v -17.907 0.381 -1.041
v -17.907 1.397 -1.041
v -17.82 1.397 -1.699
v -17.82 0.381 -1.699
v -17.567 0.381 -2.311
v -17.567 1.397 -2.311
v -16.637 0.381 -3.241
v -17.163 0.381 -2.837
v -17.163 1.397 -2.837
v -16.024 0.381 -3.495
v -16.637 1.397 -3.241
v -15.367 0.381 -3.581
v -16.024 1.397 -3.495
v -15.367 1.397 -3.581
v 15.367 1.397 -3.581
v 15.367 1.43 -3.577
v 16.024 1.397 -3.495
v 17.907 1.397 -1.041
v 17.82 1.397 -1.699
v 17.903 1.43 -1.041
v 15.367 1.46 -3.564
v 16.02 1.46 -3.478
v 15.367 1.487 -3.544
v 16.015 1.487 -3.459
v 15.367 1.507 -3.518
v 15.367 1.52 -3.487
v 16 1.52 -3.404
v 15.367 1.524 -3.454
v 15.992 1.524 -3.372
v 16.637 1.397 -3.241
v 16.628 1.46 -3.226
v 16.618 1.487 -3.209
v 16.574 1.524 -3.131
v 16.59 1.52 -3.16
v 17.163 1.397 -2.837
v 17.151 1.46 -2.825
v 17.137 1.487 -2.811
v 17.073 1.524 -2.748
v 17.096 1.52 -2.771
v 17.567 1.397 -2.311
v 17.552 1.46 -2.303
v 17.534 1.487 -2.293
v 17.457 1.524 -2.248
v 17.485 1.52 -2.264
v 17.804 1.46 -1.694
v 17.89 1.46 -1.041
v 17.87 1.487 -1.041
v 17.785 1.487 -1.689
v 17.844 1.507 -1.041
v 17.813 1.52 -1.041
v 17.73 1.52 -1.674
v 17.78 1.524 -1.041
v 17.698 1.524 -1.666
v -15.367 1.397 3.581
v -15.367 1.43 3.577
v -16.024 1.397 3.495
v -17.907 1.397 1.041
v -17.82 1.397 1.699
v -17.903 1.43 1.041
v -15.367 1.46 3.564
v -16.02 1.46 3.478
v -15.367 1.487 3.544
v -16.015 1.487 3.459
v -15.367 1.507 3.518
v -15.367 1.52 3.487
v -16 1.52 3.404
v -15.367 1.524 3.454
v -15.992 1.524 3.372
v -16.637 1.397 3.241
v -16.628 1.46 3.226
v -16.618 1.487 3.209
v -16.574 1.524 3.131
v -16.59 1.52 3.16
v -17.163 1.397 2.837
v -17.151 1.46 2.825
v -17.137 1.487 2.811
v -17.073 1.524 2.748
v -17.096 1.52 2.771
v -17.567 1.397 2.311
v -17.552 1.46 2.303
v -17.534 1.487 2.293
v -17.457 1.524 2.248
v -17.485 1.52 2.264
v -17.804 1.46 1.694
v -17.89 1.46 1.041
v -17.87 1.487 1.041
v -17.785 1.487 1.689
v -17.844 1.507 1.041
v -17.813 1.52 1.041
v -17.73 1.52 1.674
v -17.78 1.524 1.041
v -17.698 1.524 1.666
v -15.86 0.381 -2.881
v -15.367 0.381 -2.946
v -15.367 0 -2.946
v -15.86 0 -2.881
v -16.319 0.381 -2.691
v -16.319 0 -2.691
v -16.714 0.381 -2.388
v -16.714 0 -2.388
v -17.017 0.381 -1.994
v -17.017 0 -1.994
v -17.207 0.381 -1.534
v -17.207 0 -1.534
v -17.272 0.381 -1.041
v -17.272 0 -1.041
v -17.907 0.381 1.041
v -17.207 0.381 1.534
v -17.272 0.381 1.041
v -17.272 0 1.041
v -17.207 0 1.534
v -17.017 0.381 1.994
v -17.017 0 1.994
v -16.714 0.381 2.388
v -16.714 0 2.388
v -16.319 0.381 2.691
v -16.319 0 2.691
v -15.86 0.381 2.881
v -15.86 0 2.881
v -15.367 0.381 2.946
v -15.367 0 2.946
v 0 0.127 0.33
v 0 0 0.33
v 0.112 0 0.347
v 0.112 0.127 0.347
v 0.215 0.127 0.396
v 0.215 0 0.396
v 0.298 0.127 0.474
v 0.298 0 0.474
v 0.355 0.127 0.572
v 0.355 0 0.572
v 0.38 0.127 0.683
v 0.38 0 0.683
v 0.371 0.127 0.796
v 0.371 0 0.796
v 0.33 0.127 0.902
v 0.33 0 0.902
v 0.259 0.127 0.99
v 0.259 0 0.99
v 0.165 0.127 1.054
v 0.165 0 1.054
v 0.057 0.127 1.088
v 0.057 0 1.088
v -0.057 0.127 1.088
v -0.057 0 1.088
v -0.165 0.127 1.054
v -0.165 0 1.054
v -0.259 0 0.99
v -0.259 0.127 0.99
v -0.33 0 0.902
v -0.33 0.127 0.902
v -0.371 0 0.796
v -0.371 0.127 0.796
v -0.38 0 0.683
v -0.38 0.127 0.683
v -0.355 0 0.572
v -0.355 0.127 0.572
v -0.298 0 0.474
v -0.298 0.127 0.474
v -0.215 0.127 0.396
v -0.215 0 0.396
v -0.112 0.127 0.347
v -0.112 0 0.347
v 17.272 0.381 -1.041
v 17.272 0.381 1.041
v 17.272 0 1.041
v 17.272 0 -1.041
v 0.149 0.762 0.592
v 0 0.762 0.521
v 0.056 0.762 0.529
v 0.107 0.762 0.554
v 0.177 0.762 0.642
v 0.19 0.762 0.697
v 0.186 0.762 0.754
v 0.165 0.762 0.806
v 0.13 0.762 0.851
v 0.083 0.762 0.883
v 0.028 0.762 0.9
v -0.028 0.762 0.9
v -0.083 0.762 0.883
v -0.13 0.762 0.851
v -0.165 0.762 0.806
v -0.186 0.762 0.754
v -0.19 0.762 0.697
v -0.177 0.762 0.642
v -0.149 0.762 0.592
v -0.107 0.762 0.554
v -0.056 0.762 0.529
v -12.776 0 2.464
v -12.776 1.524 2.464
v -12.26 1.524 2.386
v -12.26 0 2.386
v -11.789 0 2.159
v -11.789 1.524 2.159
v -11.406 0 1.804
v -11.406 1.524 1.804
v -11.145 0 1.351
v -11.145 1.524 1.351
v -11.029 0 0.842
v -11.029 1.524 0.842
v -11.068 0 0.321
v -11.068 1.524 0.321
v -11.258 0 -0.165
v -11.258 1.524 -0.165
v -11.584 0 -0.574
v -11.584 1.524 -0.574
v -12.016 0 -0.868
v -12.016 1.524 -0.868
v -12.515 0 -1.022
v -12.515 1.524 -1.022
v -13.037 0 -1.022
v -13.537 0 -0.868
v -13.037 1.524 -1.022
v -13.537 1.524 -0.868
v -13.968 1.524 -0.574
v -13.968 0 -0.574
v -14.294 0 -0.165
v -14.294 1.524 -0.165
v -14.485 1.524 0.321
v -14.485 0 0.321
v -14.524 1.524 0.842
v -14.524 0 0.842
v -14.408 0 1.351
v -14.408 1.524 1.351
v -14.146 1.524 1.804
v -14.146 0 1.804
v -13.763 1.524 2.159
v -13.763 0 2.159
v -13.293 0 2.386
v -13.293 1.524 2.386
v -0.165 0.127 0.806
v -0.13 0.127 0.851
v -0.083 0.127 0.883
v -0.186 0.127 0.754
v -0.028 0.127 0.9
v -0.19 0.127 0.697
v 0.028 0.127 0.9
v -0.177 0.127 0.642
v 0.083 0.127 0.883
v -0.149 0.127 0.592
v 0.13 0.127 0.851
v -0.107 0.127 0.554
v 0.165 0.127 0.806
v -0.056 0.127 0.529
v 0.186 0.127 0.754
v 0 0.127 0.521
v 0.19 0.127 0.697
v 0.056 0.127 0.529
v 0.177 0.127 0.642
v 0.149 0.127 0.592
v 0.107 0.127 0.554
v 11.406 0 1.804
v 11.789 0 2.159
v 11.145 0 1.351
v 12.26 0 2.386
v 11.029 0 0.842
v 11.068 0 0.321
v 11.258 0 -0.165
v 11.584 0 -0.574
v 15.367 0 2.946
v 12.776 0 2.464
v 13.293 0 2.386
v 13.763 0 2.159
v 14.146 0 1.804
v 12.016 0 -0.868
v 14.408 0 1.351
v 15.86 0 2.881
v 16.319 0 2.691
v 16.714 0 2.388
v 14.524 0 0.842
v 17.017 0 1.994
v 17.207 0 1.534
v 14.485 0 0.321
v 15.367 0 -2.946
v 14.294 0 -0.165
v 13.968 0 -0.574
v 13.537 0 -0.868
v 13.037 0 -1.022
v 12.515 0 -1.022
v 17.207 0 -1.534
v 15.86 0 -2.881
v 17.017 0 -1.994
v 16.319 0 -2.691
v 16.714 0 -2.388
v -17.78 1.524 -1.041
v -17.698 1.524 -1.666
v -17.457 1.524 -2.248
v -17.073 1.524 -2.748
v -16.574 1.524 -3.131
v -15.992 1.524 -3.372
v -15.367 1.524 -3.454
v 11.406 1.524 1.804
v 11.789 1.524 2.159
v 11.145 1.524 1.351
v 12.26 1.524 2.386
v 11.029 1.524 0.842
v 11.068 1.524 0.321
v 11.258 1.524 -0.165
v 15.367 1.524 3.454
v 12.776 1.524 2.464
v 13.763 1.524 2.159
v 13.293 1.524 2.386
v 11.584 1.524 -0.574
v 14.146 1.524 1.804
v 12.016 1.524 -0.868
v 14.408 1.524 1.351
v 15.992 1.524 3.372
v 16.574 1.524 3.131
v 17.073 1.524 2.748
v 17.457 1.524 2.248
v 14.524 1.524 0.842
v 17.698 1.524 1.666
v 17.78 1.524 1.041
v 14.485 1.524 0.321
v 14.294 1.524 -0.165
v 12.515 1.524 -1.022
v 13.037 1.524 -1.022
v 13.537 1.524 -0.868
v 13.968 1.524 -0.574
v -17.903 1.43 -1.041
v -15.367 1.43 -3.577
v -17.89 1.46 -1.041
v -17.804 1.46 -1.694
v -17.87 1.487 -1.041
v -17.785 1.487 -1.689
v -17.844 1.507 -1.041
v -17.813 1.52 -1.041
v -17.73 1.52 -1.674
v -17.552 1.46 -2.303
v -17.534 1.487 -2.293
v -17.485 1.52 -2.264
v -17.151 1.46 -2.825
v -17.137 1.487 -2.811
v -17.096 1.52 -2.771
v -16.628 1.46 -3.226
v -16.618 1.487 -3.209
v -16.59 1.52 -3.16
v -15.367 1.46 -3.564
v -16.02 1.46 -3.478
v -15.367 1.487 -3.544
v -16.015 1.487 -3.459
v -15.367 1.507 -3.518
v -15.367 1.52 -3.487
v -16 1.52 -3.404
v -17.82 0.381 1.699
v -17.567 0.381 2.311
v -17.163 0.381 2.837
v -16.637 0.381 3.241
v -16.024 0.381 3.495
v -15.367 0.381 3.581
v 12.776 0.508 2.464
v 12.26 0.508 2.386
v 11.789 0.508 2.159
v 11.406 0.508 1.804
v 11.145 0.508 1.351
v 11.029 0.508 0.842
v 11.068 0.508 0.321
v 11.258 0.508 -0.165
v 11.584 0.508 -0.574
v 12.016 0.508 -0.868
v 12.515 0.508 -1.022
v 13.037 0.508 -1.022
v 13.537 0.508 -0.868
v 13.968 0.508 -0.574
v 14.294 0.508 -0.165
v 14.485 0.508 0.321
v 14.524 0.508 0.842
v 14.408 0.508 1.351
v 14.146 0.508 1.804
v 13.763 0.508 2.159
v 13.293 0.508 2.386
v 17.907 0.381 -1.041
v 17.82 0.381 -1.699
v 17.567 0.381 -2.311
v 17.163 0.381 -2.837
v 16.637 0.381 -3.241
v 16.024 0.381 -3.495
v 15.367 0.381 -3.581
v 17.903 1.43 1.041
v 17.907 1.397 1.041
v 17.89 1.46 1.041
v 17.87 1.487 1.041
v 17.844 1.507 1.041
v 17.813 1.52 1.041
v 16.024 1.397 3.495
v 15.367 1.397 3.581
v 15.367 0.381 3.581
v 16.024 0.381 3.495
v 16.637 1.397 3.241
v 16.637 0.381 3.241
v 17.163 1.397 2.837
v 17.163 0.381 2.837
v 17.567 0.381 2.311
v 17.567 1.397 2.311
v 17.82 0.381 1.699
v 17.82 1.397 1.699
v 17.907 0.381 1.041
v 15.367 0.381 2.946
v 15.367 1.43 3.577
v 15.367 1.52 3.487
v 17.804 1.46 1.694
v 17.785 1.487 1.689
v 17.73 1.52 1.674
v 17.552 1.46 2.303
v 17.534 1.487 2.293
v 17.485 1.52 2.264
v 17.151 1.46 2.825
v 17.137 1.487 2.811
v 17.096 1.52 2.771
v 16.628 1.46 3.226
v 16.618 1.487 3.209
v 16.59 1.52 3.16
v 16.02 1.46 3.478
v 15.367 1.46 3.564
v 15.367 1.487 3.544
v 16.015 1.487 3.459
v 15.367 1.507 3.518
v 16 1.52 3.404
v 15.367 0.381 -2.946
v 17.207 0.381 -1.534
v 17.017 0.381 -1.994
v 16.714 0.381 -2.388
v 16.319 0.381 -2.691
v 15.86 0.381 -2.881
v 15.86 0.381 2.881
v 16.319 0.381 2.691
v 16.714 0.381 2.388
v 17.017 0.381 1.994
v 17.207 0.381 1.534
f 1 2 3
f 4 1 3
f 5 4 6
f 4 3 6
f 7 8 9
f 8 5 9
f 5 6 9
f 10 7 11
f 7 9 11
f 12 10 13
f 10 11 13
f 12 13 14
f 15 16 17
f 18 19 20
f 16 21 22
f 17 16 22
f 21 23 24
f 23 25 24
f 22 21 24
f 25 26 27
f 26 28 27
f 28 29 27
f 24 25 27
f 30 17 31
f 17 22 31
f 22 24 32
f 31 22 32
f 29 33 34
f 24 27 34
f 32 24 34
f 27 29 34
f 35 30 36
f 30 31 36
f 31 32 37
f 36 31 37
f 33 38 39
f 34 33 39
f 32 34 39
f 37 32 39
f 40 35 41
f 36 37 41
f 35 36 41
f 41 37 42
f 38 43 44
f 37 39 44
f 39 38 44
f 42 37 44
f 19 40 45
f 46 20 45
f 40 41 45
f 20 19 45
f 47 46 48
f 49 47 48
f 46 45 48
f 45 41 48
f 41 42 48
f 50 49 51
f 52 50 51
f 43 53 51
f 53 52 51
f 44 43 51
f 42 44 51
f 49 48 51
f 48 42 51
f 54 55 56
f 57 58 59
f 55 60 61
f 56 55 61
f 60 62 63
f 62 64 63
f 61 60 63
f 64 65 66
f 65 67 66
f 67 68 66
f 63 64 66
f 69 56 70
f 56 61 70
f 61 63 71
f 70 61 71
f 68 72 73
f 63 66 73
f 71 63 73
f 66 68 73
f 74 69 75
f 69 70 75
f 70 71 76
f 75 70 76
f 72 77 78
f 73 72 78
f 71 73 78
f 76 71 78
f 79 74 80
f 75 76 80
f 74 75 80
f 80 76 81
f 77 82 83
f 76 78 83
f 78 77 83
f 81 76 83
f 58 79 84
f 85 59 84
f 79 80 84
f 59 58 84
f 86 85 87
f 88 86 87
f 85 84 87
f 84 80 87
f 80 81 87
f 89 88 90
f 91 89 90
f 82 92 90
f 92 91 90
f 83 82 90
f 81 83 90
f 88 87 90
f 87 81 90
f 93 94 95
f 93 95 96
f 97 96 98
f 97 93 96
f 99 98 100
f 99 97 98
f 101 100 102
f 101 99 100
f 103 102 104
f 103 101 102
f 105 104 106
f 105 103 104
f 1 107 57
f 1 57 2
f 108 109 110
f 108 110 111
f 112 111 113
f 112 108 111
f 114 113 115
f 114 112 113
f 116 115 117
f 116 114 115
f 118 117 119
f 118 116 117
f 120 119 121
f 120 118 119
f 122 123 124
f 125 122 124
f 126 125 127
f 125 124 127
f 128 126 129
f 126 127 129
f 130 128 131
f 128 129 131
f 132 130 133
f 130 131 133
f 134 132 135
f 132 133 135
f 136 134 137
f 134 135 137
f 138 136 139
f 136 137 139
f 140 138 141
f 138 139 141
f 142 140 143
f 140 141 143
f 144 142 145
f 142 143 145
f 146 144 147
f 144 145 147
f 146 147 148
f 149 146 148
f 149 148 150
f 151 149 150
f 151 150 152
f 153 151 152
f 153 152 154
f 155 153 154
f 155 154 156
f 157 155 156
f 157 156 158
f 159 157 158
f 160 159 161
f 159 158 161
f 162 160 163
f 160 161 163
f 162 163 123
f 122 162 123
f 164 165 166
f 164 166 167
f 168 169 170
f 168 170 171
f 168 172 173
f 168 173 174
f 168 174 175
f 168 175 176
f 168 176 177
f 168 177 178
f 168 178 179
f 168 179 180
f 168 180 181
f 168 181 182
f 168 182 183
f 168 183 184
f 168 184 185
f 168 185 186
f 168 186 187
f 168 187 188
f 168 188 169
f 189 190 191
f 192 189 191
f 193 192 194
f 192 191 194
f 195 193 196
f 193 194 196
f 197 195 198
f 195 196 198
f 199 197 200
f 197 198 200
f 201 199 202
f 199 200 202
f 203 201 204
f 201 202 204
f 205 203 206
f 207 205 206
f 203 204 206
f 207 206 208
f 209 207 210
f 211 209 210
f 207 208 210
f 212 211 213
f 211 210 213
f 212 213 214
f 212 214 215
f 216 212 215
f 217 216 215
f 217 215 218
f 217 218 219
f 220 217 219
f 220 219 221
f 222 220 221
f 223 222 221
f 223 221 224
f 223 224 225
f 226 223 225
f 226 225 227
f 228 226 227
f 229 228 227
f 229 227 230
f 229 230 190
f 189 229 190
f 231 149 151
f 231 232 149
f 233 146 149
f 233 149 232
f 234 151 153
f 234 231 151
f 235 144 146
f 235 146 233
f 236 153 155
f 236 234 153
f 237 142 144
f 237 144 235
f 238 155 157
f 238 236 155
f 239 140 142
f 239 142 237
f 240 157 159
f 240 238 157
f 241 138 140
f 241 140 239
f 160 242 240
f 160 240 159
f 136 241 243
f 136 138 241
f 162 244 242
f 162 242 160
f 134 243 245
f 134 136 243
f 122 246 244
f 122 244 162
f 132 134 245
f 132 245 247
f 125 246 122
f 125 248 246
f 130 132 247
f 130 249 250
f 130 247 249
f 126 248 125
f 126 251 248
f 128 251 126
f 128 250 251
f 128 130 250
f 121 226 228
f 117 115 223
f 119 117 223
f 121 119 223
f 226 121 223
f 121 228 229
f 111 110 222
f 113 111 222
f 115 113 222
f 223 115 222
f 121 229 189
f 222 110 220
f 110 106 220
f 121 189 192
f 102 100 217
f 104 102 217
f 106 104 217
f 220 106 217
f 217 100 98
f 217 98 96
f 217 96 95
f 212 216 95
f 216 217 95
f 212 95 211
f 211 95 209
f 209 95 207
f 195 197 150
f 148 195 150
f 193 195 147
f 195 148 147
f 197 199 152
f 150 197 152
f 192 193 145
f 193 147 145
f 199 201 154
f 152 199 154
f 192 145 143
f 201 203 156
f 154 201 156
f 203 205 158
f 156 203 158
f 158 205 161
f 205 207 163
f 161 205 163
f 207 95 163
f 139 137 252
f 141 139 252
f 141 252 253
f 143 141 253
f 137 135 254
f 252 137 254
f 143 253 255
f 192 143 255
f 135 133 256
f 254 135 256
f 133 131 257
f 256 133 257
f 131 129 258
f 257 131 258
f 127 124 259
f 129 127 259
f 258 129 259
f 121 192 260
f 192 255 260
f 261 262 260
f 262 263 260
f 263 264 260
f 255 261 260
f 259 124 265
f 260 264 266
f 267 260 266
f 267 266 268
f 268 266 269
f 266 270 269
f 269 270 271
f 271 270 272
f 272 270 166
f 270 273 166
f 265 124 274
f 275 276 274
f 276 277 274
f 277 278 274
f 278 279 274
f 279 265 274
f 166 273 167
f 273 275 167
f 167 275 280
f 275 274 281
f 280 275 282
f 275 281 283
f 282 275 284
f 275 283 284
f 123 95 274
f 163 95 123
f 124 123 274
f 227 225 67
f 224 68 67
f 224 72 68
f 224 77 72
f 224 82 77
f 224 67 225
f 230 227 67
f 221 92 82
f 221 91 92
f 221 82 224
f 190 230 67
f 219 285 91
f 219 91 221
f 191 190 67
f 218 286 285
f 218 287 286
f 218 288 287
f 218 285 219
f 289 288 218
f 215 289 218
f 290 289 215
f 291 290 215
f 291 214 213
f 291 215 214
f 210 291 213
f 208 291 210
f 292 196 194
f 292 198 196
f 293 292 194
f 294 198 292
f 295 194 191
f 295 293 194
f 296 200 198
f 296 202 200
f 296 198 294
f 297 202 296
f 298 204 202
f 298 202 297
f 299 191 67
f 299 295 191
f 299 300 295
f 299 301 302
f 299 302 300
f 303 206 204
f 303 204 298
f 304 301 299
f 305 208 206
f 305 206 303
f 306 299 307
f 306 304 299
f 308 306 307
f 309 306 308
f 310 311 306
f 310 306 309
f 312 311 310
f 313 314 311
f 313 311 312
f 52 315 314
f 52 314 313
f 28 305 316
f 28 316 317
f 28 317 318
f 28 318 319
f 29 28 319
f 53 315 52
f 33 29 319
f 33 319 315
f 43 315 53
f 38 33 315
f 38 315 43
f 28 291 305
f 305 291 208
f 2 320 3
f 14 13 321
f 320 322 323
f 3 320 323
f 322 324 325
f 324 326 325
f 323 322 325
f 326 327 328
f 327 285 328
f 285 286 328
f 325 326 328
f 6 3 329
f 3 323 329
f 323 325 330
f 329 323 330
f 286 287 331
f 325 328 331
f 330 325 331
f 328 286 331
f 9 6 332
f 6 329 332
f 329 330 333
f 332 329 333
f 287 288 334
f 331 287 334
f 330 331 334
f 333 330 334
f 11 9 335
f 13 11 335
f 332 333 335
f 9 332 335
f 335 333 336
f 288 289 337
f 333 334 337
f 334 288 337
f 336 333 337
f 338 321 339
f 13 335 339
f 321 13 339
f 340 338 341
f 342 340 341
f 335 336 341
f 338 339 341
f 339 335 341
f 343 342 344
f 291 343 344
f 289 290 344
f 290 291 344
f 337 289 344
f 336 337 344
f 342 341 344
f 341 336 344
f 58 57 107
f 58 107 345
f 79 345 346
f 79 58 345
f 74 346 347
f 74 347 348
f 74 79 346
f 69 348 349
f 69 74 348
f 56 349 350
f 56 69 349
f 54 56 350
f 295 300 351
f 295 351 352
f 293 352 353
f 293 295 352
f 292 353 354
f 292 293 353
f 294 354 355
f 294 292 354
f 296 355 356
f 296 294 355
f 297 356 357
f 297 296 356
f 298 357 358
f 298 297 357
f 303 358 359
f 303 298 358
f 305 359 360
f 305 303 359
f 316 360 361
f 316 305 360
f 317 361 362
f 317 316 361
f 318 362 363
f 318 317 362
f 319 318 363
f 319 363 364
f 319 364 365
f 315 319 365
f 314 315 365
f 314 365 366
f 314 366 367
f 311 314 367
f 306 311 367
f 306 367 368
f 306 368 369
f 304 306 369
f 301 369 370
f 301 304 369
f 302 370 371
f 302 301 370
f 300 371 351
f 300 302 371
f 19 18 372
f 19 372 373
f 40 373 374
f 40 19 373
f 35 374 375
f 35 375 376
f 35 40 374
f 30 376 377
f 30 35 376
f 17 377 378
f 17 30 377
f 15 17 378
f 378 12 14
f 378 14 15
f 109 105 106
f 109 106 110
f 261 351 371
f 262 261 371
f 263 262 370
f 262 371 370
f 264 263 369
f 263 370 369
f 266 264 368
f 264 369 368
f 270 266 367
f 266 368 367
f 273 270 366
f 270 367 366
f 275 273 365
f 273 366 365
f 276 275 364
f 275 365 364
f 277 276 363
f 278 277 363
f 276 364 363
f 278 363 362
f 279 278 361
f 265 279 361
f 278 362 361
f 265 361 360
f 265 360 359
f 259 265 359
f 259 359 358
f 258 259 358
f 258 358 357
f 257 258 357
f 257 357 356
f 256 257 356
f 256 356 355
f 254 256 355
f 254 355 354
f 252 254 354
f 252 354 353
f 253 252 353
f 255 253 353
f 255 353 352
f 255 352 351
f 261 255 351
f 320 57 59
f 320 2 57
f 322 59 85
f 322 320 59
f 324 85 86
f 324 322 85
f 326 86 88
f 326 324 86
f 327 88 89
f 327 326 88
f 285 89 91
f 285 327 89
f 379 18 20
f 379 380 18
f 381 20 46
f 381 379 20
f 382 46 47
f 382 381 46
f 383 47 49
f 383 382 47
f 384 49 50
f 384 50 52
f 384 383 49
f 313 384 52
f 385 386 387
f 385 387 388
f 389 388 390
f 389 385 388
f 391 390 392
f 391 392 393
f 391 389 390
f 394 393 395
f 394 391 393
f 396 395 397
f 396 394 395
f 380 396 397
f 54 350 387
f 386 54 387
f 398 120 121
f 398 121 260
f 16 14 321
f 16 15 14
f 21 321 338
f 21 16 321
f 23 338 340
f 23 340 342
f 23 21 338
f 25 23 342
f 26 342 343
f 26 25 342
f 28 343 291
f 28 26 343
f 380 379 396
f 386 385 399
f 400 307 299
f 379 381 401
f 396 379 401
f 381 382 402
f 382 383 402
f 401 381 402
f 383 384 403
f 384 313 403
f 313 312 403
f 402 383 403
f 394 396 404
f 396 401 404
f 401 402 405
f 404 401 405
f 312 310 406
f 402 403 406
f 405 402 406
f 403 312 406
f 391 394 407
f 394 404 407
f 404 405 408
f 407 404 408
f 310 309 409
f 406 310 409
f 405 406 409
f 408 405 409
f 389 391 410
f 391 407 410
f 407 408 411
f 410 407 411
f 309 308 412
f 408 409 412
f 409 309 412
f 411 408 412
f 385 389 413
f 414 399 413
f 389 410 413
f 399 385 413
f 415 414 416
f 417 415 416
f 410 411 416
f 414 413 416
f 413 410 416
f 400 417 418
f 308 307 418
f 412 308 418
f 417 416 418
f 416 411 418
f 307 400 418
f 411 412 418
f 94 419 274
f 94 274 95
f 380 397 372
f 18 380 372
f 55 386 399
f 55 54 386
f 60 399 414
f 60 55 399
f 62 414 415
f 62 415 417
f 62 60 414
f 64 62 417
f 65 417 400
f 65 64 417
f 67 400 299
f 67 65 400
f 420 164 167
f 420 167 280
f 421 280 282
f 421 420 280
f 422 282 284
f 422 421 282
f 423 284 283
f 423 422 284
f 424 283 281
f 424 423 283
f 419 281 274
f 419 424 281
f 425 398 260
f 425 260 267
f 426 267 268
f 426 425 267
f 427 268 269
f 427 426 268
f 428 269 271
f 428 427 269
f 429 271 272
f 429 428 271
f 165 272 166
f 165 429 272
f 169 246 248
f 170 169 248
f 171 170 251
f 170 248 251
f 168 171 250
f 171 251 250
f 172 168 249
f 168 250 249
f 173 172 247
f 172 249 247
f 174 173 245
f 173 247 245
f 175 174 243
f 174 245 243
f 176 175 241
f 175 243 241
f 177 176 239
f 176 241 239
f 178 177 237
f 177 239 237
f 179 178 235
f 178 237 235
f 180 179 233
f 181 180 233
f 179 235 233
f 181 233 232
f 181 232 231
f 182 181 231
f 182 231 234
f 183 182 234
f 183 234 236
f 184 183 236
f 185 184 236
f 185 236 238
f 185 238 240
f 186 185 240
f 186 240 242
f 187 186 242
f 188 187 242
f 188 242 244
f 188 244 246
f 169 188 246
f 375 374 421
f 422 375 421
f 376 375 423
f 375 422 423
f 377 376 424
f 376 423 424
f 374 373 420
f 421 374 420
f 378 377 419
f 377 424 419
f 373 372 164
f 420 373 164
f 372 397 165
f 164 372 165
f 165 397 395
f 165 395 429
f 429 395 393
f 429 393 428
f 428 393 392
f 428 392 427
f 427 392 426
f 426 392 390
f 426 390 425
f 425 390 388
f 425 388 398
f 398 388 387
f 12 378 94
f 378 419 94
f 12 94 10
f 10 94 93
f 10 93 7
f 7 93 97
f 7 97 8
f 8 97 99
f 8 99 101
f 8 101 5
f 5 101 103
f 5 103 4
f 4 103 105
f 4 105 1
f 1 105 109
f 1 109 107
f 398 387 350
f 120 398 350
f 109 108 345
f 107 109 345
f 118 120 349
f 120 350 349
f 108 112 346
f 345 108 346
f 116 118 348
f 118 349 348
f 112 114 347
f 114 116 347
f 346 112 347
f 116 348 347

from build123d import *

# Parameters (mm, degrees)
SKETCH1_W           = 35.814
SKETCH1_H           = 7.1628
BOSS_EXTRUDE1_DEPTH = 1.524
FILLET1_R           = 2.54
FILLET2_R           = 0.127
BOSS_EXTRUDE2_DEPTH = 0.381
SKETCH5_R           = 1.2827
CUT_EXTRUDE2_DEPTH  = 2.54
SKETCH9_R           = 1.7526
CUT_EXTRUDE5_DEPTH  = 1.016
CUT_EXTRUDE6_START  = -0.381
CUT_EXTRUDE6_DEPTH  = 0.381
SKETCH17_R          = 1.7526
CUT_EXTRUDE11_DEPTH = 19.289869627
SKETCH18_R          = 1.7526
CUT_EXTRUDE12_DEPTH = 19.325109849
SKETCH19_R          = 0.381
CUT_EXTRUDE13_DEPTH = 0.127
SKETCH20_R          = 0.1905
CUT_EXTRUDE14_DEPTH = 0.762


with BuildPart() as part:
    # Sketch1 → Boss-Extrude1 (new body)
    with BuildSketch(Plane(origin=(0, 0, 0), x_dir=(1, 0, 0), z_dir=(0, 1, 0))):
        Rectangle(SKETCH1_W, SKETCH1_H)
    extrude(amount=BOSS_EXTRUDE1_DEPTH)

    # Fillet1
    fillet1_edges = [part.edges().sort_by_distance(p)[0] for p in [
        (-17.907, 0.762, -3.5814),
        (17.907, 0.762, -3.5814),
        (17.907, 0.762, 3.5814),
        (-17.907, 0.762, 3.5814),
    ]]
    fillet(fillet1_edges, radius=FILLET1_R)

    # Fillet2
    fillet2_edges = [part.edges().sort_by_distance(p)[0] for p in [
        (-17.907, 1.524, 0),
        (0, 1.524, -3.5814),
        (0, 1.524, 3.5814),
        (17.907, 1.524, 0),
        (17.163051224, 1.524, 2.837451224),
        (17.163051224, 1.524, -2.837451224),
        (-17.163051224, 1.524, 2.837451224),
        (-17.163051224, 1.524, -2.837451224),
    ]]
    fillet(fillet2_edges, radius=FILLET2_R)

    # Sketch4 → Boss-Extrude2 (add)
    with BuildSketch(Plane.XZ.offset(-0.381)):
        with BuildLine():
            Line((-15.367, 2.9464), (-15.367, 3.2004))
            ThreePointArc((-15.367, 3.2004), (-16.893643541, 2.568043541), (-17.526, 1.0414))
            Line((-17.526, 1.0414), (-17.526, -1.0414))
            ThreePointArc((-17.526, -1.0414), (-16.893643541, -2.568043541), (-15.367, -3.2004))
            Line((-15.367, -3.2004), (-15.367, -2.9464))
            ThreePointArc((-15.367, -2.9464), (-16.714038418, -2.388438418), (-17.272, -1.0414))
            Line((-17.272, -1.0414), (-17.272, 1.0414))
            ThreePointArc((-17.272, 1.0414), (-16.714038418, 2.388438418), (-15.367, 2.9464))
        make_face()
    boss_extrude2 = extrude(amount=BOSS_EXTRUDE2_DEPTH)

    # Mirror3: Boss-Extrude2 across plane
    add(boss_extrude2.mirror(Plane(origin=(0, 0, 0), x_dir=(0, 0, 1), z_dir=(1, 0, 0))))

    # Sketch5 → Cut-Extrude2 (cut)
    with BuildSketch(Plane(origin=(0, 1.524, 0), x_dir=(1, 0, 0), z_dir=(0, 1, 0))):
        with Locations(Location((-12.7762, -0.7112, 0), (0, 0, 270))):
            Circle(SKETCH5_R)
    cut_extrude2 = extrude(amount=-CUT_EXTRUDE2_DEPTH, mode=Mode.SUBTRACT)

    # Sketch9 → Cut-Extrude5 (cut)
    with BuildSketch(Plane(origin=(0, 1.524, 0), x_dir=(1, 0, 0), z_dir=(0, 1, 0))):
        with Locations(Location((-12.7762, -0.7112, 0), (0, 0, 270))):
            Circle(SKETCH9_R)
    cut_extrude5 = extrude(amount=-CUT_EXTRUDE5_DEPTH, mode=Mode.SUBTRACT)

    # Mirror4: Cut-Extrude2, Cut-Extrude5 across plane
    add(cut_extrude2.mirror(Plane(origin=(0, 0, 0), x_dir=(0, 0, 1), z_dir=(1, 0, 0))), mode=Mode.SUBTRACT)
    add(cut_extrude5.mirror(Plane(origin=(0, 0, 0), x_dir=(0, 0, 1), z_dir=(1, 0, 0))), mode=Mode.SUBTRACT)

    # Sketch10 → Cut-Extrude6 (cut)
    with BuildSketch(Plane.XZ.offset(CUT_EXTRUDE6_START)):
        with BuildLine():
            Line((17.907, 1.0414), (17.907, -1.0414))
            ThreePointArc((17.907, -1.0414), (17.163051224, -2.837451224), (15.367, -3.5814))
            Line((15.367, -3.5814), (-15.367, -3.5814))
            ThreePointArc((-15.367, -3.5814), (-17.163051224, -2.837451224), (-17.907, -1.0414))
            Line((-17.907, -1.0414), (-17.907, 1.0414))
            ThreePointArc((-17.907, 1.0414), (-17.163051224, 2.837451224), (-15.367, 3.5814))
            Line((-15.367, 3.5814), (15.367, 3.5814))
            ThreePointArc((15.367, 3.5814), (17.163051224, 2.837451224), (17.907, 1.0414))
        make_face()
        with BuildLine():
            Line((-15.367, 2.9464), (15.367, 2.9464))
            ThreePointArc((15.367, 2.9464), (16.714038418, 2.388438418), (17.272, 1.0414))
            Line((17.272, 1.0414), (17.272, -1.0414))
            ThreePointArc((17.272, -1.0414), (16.714038418, -2.388438418), (15.367, -2.9464))
            Line((15.367, -2.9464), (-15.367, -2.9464))
            ThreePointArc((-15.367, -2.9464), (-16.714038418, -2.388438418), (-17.272, -1.0414))
            Line((-17.272, -1.0414), (-17.272, 1.0414))
            ThreePointArc((-17.272, 1.0414), (-16.714038418, 2.388438418), (-15.367, 2.9464))
        make_face(mode=Mode.SUBTRACT)
    extrude(amount=CUT_EXTRUDE6_DEPTH, mode=Mode.SUBTRACT)

    # Sketch17 → Cut-Extrude11 (cut, through all)
    with BuildSketch(Plane(origin=(0, 0.508, 0), x_dir=(1, 0, 0), z_dir=(0, 1, 0))):
        with Locations(Location((-12.7762, -0.7112, 0), (0, 0, 270))):
            Circle(SKETCH17_R)
    extrude(amount=-CUT_EXTRUDE11_DEPTH, mode=Mode.SUBTRACT)

    # Sketch18 → Cut-Extrude12 (cut, through all)
    with BuildSketch(Plane(origin=(0, 1.524, 0), x_dir=(1, 0, 0), z_dir=(0, 1, 0))):
        with Locations(Location((12.7762, -0.7112, 0), (0, 0, 270))):
            Circle(SKETCH18_R)
    extrude(amount=-CUT_EXTRUDE12_DEPTH, mode=Mode.SUBTRACT)

    # Sketch19 → Cut-Extrude13 (cut)
    with BuildSketch(Plane.XZ):
        with Locations(Location((0, 0.7112, 0), (0, 0, 270))):
            Circle(SKETCH19_R)
    extrude(amount=-CUT_EXTRUDE13_DEPTH, mode=Mode.SUBTRACT)

    # Sketch20 → Cut-Extrude14 (cut)
    with BuildSketch(Plane.XZ):
        with Locations(Location((0, 0.7112, 0), (0, 0, 270))):
            Circle(SKETCH20_R)
    extrude(amount=-CUT_EXTRUDE14_DEPTH, mode=Mode.SUBTRACT)


solid = part.part
